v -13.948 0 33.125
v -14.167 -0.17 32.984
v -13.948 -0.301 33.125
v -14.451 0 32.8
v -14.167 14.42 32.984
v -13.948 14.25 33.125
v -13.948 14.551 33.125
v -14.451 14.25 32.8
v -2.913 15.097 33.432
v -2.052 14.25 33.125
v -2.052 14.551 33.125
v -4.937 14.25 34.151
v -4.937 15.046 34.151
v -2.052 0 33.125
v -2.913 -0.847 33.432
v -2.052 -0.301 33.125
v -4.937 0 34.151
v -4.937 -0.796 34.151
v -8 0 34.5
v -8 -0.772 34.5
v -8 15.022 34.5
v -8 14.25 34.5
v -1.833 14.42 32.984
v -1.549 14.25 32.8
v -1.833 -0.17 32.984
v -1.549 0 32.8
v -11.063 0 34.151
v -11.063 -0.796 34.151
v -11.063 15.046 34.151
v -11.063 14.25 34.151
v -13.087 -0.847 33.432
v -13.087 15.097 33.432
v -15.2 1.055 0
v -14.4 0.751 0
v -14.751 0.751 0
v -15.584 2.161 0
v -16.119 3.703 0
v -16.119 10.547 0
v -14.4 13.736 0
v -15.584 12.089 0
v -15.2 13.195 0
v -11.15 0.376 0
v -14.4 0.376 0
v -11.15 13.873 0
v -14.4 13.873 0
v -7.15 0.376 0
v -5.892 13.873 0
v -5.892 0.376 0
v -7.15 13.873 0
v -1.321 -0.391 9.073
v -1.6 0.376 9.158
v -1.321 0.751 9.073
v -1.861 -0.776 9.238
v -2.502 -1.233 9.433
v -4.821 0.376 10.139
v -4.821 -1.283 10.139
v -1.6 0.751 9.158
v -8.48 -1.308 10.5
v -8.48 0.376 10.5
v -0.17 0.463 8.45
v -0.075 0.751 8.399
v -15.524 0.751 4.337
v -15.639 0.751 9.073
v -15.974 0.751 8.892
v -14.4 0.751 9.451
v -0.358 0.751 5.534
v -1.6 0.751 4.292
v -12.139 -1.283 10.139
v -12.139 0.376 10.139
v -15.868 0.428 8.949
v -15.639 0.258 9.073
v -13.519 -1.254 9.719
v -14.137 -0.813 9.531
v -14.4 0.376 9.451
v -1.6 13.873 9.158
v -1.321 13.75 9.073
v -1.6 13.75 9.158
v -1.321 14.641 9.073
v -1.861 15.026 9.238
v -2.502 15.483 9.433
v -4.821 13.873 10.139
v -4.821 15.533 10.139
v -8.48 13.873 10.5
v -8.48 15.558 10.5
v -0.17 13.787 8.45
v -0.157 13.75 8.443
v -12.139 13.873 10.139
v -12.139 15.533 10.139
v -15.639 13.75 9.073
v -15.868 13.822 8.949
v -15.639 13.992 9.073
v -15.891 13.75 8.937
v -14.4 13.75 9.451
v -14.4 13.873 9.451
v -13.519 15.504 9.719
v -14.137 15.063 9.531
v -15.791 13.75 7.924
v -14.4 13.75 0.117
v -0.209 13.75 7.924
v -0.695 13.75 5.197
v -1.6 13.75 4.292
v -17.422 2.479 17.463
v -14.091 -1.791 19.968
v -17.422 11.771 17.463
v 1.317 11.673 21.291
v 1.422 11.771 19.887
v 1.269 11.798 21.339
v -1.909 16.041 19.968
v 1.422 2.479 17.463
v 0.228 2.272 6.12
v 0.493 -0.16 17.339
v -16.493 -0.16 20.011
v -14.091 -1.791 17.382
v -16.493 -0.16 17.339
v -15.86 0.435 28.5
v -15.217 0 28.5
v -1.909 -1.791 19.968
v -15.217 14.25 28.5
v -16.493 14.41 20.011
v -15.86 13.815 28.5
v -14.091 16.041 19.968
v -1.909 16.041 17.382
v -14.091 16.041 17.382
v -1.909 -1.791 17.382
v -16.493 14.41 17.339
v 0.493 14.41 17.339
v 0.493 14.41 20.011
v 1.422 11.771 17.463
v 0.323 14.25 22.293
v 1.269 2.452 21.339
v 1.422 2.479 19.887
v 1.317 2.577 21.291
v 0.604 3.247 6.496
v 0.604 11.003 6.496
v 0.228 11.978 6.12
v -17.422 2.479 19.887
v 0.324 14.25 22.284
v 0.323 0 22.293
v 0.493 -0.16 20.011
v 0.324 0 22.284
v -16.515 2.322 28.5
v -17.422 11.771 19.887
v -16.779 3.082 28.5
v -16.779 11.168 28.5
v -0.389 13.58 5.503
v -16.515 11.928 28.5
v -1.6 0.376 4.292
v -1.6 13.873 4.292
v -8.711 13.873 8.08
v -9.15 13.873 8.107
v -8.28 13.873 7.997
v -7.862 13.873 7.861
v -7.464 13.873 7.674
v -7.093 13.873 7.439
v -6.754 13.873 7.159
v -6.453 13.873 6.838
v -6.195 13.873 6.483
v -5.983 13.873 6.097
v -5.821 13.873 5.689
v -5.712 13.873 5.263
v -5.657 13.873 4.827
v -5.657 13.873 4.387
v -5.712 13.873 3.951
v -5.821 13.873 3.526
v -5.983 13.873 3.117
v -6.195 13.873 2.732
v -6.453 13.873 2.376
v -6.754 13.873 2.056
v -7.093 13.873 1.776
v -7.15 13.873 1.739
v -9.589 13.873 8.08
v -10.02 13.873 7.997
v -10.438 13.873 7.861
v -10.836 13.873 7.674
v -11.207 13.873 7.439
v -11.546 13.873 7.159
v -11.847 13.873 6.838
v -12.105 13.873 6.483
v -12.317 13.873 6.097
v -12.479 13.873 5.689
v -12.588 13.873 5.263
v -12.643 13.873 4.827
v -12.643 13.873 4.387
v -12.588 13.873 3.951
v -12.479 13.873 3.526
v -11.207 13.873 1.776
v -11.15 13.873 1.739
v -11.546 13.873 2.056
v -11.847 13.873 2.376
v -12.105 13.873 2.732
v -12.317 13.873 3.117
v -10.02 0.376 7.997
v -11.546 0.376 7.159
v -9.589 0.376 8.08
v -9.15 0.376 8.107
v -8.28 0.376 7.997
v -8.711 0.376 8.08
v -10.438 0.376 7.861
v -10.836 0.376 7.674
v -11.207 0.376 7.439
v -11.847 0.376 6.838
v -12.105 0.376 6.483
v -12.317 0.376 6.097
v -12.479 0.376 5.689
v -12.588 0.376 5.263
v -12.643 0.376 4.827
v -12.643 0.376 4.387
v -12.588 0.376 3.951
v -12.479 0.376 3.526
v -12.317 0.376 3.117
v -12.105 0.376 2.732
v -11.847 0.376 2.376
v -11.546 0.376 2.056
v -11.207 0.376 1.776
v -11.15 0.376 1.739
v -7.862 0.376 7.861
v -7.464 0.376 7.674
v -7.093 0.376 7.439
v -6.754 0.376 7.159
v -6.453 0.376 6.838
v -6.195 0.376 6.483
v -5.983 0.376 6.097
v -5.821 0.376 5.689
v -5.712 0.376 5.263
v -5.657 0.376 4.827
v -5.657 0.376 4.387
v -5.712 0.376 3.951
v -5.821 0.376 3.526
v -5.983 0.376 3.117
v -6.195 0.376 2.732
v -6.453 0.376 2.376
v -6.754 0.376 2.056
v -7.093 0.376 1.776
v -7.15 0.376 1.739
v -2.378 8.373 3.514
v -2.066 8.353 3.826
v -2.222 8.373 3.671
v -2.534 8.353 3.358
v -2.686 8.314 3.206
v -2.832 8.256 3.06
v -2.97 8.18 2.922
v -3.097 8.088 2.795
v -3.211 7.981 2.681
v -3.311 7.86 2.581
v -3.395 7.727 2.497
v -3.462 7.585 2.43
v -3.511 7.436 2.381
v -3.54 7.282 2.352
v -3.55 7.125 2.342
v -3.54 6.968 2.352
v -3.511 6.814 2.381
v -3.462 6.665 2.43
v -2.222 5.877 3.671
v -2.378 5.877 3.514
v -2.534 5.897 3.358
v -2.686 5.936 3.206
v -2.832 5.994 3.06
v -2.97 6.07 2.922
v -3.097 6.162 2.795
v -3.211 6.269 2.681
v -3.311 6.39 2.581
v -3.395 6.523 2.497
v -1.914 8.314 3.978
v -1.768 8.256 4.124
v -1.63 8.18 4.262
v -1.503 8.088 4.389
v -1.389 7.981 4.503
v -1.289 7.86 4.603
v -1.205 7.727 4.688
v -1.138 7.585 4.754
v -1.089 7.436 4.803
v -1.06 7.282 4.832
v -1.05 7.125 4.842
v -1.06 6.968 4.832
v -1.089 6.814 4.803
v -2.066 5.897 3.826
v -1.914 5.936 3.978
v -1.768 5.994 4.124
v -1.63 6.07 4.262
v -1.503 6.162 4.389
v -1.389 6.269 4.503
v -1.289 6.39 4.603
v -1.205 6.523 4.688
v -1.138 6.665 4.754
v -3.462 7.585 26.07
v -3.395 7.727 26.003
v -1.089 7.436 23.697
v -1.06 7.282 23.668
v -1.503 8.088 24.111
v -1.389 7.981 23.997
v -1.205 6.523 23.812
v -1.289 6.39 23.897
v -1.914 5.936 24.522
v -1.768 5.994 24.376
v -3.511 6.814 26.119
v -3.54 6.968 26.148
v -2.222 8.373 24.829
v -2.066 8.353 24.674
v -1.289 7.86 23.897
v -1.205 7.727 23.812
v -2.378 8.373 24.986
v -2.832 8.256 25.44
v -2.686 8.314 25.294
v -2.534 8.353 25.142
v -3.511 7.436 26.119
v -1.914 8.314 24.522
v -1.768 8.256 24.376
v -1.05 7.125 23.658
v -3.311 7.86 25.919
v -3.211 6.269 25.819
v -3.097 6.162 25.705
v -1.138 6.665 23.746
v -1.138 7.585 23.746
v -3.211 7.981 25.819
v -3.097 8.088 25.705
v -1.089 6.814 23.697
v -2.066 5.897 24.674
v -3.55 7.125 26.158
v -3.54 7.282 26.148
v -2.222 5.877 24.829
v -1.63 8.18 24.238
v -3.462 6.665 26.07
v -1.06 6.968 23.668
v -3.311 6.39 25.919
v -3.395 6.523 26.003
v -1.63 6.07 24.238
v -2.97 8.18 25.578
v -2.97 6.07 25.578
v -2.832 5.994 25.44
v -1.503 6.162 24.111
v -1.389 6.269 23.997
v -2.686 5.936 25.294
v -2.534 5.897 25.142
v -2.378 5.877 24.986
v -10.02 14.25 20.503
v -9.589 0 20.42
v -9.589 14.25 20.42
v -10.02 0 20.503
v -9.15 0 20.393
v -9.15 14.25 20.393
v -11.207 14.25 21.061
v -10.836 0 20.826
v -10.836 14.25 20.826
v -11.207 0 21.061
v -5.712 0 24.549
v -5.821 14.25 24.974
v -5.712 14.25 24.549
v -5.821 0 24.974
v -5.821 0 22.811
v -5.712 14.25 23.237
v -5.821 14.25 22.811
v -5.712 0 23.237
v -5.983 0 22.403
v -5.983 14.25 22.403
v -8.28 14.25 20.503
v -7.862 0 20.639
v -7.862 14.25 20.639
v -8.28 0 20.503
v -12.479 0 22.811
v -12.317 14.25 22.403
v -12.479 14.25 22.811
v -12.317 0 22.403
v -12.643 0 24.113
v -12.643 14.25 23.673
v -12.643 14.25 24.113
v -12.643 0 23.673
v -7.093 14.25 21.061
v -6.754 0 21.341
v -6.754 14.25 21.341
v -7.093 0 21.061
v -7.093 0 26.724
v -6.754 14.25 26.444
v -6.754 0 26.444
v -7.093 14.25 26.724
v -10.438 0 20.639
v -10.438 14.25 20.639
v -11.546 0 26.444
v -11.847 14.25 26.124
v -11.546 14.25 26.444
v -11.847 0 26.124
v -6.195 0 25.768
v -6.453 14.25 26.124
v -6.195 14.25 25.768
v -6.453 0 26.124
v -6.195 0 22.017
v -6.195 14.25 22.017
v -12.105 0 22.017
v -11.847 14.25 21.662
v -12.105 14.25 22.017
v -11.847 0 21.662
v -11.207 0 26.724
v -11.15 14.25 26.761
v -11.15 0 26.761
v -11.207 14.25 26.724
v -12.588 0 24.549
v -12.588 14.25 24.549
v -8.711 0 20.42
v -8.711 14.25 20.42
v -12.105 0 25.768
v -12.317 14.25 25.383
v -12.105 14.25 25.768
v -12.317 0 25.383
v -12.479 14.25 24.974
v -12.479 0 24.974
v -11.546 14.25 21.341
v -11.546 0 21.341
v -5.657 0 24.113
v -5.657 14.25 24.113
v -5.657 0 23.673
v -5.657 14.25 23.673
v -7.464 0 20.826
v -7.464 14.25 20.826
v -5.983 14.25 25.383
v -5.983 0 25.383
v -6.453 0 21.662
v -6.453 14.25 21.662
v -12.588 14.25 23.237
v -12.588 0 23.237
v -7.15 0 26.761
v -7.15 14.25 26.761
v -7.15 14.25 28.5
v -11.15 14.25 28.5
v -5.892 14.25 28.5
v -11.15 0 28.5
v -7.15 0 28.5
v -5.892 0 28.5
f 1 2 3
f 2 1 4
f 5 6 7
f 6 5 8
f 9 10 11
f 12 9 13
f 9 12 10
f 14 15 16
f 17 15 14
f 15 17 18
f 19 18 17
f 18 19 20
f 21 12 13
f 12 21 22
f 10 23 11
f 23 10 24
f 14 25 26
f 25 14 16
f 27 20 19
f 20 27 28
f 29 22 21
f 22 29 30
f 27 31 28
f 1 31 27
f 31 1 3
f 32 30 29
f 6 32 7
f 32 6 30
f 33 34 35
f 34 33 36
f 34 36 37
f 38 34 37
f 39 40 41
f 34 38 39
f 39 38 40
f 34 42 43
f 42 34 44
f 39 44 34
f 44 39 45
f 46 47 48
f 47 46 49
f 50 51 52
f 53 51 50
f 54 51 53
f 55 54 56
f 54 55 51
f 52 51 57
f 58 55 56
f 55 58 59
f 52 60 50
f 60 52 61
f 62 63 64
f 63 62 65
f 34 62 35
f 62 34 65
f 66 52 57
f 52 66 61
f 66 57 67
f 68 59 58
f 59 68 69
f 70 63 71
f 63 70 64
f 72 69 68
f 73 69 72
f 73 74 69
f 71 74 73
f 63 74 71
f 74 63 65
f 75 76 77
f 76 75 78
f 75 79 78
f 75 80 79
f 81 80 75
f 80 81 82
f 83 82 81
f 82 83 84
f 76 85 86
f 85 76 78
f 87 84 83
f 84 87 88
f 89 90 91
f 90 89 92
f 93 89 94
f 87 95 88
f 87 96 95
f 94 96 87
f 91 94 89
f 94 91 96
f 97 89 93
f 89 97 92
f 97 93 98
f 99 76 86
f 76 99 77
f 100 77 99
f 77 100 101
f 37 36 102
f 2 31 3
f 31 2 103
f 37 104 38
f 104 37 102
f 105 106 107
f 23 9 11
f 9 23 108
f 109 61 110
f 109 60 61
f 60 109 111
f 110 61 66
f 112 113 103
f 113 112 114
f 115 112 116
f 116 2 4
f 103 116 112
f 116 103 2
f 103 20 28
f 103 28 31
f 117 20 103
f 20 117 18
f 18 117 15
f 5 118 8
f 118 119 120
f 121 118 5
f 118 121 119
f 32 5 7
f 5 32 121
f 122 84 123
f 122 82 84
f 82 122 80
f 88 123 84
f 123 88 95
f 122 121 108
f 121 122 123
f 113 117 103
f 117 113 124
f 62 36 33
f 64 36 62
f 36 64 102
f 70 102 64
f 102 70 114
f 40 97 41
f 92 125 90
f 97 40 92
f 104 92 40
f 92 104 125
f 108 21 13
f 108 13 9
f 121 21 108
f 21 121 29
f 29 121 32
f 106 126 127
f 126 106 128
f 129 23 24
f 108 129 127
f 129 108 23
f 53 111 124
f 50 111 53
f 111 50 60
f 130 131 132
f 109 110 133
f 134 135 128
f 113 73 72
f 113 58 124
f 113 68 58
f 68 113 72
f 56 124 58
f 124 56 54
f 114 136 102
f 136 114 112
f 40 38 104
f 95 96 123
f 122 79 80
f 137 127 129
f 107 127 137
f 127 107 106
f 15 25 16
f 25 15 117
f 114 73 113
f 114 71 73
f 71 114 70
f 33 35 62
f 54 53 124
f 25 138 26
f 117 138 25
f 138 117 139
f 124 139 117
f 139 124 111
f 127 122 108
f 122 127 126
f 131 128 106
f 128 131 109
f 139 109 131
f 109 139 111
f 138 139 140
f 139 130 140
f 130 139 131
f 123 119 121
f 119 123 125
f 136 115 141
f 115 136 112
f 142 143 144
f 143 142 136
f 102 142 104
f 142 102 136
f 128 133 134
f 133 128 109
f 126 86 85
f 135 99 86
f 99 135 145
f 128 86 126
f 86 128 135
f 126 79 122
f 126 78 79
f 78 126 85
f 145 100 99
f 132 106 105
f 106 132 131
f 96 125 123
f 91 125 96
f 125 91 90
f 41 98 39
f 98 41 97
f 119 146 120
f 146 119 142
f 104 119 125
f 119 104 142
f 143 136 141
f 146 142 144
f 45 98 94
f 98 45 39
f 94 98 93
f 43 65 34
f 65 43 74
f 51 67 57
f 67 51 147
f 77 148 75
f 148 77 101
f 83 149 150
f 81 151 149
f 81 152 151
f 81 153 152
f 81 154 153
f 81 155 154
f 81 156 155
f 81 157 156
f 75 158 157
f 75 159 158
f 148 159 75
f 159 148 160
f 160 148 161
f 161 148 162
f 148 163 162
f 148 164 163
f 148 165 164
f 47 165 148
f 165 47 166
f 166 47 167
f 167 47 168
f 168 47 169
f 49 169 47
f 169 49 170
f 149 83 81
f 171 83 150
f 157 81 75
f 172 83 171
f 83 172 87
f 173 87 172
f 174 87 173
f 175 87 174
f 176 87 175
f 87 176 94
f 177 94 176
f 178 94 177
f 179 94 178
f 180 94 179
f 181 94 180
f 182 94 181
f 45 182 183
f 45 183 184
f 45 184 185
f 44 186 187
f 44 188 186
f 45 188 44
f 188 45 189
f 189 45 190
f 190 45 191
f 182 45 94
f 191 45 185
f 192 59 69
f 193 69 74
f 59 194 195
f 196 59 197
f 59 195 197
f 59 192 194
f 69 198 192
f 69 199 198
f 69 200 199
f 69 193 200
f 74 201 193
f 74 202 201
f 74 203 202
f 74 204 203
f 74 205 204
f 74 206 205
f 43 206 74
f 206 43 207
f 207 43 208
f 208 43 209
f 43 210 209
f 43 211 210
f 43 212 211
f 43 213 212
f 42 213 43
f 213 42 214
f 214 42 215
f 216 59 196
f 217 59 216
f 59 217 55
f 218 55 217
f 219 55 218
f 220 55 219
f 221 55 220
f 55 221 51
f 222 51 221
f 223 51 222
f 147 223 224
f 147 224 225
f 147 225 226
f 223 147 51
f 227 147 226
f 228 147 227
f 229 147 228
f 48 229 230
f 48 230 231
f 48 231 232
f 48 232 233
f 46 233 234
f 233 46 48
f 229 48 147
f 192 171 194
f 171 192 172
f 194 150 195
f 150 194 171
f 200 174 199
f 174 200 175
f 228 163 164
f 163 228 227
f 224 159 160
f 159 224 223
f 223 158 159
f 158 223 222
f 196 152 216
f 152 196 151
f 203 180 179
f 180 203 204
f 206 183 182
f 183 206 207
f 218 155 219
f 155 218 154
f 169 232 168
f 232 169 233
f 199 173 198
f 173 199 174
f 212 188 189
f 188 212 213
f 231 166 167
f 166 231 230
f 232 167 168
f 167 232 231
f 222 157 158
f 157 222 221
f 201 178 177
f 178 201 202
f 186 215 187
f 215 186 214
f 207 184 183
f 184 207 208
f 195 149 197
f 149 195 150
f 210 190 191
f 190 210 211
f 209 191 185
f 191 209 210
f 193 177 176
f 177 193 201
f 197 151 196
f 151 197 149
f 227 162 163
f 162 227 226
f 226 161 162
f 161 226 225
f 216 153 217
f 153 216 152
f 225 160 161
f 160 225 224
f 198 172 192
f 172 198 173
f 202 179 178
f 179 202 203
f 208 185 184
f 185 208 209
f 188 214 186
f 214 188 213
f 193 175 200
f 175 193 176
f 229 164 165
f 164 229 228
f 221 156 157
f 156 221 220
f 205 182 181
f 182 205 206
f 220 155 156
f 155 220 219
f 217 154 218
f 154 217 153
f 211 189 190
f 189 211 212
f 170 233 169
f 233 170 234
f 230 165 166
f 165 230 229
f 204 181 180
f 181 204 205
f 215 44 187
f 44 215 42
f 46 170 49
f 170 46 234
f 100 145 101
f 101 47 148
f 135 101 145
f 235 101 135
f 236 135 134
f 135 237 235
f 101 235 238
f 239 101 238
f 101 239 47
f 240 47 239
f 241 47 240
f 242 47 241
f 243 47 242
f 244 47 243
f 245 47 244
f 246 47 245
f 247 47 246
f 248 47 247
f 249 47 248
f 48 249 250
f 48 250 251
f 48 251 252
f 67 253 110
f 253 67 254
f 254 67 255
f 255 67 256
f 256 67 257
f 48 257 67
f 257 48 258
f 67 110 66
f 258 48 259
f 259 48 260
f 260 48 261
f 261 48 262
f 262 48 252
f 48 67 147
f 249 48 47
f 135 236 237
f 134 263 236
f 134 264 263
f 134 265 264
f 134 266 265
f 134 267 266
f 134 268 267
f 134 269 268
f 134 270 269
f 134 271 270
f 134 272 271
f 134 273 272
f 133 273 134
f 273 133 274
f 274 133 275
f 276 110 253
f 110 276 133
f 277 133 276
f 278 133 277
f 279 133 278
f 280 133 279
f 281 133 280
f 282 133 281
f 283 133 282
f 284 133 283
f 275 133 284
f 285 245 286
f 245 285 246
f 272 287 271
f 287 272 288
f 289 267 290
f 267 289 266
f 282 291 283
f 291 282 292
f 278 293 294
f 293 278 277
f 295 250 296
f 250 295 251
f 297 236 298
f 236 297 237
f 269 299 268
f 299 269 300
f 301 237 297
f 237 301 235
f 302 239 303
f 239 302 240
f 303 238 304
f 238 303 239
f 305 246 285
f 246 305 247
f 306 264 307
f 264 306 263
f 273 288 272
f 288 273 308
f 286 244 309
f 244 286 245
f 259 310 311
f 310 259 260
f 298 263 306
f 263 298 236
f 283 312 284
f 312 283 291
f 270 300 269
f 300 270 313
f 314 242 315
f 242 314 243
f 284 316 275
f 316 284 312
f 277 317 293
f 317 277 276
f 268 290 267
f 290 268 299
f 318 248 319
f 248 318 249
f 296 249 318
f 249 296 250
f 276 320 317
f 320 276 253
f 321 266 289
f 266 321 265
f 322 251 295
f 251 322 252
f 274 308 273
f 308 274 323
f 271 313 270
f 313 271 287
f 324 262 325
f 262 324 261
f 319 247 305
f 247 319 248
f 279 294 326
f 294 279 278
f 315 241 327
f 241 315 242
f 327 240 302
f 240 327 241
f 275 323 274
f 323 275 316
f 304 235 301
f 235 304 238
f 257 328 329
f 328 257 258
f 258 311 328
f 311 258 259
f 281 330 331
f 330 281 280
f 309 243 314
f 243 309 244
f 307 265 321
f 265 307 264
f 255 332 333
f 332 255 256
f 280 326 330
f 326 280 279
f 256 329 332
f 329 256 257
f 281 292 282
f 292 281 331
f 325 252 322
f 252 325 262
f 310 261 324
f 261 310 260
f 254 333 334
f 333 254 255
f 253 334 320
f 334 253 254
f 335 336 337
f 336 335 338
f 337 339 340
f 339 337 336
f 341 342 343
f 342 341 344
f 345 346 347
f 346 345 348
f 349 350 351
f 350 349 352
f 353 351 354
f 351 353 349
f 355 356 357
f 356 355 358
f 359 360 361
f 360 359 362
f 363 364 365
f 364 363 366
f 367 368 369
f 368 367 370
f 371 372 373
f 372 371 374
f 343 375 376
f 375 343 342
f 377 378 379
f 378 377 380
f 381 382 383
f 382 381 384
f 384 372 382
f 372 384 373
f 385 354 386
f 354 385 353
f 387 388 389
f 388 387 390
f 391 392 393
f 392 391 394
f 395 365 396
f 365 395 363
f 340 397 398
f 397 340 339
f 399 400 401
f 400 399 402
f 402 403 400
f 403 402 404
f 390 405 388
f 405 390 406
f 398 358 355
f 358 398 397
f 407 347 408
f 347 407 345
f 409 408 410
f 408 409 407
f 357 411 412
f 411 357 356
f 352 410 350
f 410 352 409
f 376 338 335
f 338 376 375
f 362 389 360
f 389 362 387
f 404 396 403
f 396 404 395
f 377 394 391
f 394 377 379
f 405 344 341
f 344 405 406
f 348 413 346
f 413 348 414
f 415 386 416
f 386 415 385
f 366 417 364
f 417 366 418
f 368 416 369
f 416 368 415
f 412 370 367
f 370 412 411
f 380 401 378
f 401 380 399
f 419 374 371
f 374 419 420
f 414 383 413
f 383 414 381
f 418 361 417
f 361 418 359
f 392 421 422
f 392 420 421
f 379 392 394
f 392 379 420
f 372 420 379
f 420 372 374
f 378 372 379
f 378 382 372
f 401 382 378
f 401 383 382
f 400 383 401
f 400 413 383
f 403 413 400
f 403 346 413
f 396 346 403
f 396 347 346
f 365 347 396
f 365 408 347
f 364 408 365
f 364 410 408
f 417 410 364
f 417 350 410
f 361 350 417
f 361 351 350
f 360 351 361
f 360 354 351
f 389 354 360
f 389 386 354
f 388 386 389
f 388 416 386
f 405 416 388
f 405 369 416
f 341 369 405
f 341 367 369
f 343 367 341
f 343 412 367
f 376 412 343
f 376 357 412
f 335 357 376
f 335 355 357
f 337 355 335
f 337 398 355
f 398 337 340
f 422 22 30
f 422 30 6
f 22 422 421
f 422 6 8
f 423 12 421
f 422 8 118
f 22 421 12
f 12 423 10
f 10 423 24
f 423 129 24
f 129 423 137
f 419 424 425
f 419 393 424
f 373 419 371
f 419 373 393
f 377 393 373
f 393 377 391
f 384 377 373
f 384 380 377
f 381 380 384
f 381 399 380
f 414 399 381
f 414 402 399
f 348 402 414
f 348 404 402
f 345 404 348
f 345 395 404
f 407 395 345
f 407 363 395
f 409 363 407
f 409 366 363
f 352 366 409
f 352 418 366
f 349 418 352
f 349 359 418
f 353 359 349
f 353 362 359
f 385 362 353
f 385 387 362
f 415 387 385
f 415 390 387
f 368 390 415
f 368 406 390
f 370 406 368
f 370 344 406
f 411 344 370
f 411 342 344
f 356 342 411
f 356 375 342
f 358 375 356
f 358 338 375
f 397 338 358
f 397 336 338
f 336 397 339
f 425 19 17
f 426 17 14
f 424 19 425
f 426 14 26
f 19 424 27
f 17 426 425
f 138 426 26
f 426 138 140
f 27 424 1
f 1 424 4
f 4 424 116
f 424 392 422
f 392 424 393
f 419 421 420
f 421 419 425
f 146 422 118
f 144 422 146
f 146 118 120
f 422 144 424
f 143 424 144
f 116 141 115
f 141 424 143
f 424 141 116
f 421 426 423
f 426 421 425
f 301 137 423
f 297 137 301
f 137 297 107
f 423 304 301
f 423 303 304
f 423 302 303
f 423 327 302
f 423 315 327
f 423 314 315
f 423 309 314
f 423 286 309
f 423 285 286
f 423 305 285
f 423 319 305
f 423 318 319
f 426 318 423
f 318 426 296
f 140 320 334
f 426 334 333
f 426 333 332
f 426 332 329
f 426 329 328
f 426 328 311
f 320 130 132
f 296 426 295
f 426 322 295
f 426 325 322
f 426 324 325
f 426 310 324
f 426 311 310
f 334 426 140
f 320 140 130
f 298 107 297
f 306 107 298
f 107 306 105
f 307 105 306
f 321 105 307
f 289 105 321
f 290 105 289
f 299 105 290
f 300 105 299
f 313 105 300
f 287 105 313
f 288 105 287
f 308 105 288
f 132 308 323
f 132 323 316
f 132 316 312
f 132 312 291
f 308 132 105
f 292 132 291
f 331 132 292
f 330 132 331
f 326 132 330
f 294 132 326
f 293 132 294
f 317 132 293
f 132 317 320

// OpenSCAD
// file: finger_mid.scad
include <../config.scad>
use <finger_base.scad>

rotate([0,-90,0]) fingermid();

//	Middle segment of finger, can be lengthened
module fingermid(length=19, proximalHole=true, distalHole=true)
{
	difference() {
		scale([yScaleFactor,xScaleFactor,zScaleFactor]) {
			fingerbasesolid(length);
		}
		if(proximalHole) {
			translate([0,knucklePadding/2 * xScaleFactor,0]) fingerhardwarecutouts(jointDia, jointThick, knuckleW=knuckleW-knucklePadding, fingerLen=length);
		}
		if(distalHole) {
			translate([length * yScaleFactor,0,0]) mirror([1,0,0]) fingerhardwarecutouts(jointDia, jointThick, knuckleW=knuckleW, fingerLen=length);
		}
	}
}
// file: finger_base.scad
include <../config.scad>

//rotate([0,-90,0]) fingerbase();

//	Base segment of finger, can be lengthened
module fingerbase(length=23, proximalHole=true, distalHole=true)
{
	difference() {
		scale([yScaleFactor,xScaleFactor,zScaleFactor]) {
			fingerbasesolid(length);
		}
		if(proximalHole) {
			translate([0,knucklePadding/2 * xScaleFactor,0]) fingerhardwarecutouts(jointDia, jointThick, knuckleW=knuckleW-knucklePadding, fingerLen=length);
		}
		if (distalHole) {
			translate([length * yScaleFactor,0,0]) mirror([1,0,0]) fingerhardwarecutouts(jointDia, jointThick, knuckleW=knuckleW, fingerLen=length);
		}
	}


	
}

module fingerhardwarecutouts(jointDia,jointThick,knuckleW,fingerLen,holeCutoff=100) {
	//slot for flex joint
	translate([7 - (15/jointDia),0,6*zScaleFactor - (1.8/jointThick)]) {
		rotate([90,0,0]) translate([-0.25,0,-knuckleW*xScaleFactor]) cylinder(d=jointDia, h=knuckleW*xScaleFactor, $fn=50);
		translate([-25,(knuckleW*xScaleFactor) / 2,0]) cube([50,knuckleW*xScaleFactor,jointThick], center=true);
	}
	//cubic parts
	translate([-100,0,0]) cube([100,knuckleW*xScaleFactor,100]);
	translate([-5.5*yScaleFactor,0,0]) rotate([0,45,0]) translate([-50,0,0]) cube([100,knuckleW * xScaleFactor, 10]);

	//channel for string/tendon
	translate([-fingerLen/2 * yScaleFactor, knuckleW/2 * xScaleFactor, 2.3]) rotate([0,90,0]) cylinder(d=2.5, h=holeCutoff, $fn=50);
}

//	base segment of finger, solid
module fingerbasesolid(length=50, cutout=true) {
	difference() {
		//cubic part
		translate([0,0.001 + knucklePadding/2,1]) cube([length, knuckleW - knucklePadding - 0.002, 8]);
	}
	
	//cylindrical-ish part around finger
	intersection() {
		//overly large shape to get the cross section in the XZ plane from
		difference() {
			union() {
				translate([length-4,-5,5]) rotate([-90,0,0]) cylinder(r=8,h=knuckleW + 10);
				translate([0,-5,-5]) cube([length,knuckleW + 10,20]);
			}
			//cutout for the side "guards" of the previous knuckle
			if(cutout) {
				translate([-4,-knuckleW+0.001,5.3]) rotate([-90,0,0]) cylinder(r=11,h=10);
				translate([-4,knuckleW - knucklePadding*(1/xScaleFactor),5.3]) rotate([-90,0,0]) cylinder(r=11,h=10);
			}
		}

		hull() {
			for(i=[-1,1], j=[-1,1]) {
				//angled cylinders to provide the outer shape of the finger
				translate([length/10,i*2.4 + knuckleW/2,j*2.2 + 5]) rotate([i*j*-4,j*86,0]) cylinder(d=6,h=20,center=true);
				translate([length+4, i*2.4 + knuckleW/2, j*2.2 + 5]) rotate([i*j*-4,j*-86,0]) cylinder(d=6,h=20,center=true);
			}
		}
	}
}
// file: finger_tip.scad
include <../config.scad>
include <finger_base.scad>
include <finger_mid.scad>

//rotate([0,-90,0]) fingertip_curved_solid(pad=fingerPads);

/**
 * @id finger_tip
 * @name Finger Tip
 * @category Printed
 */

module fingertip_curved_solid(length=17, pad=true, hole=true) {
//	if (!pad)
//		fingertip(length=length);
//	else {
		render() difference() {
			union() {
				fingermid(length=length+3, proximalHole=true, distalHole=false);
				translate([length*yScaleFactor,0,1.5*zScaleFactor]) rotate([0,30,0]) fingertip(length=length, proximalHole=false, cutout=false);
			}
			//hole for string
			if(hole) translate([0,xScaleFactor * knuckleW/2,2]) rotate([0,90,0]) cylinder(d=2.5,h=100, $fn=50);
			//hollow for soft pad
			if(pad) translate([length*yScaleFactor,0,1.5*zScaleFactor]) rotate([0,30,0]) fingertip_pad(length);
		}
//	}
}

module fingertip_solid(length=15, pad=true) {
	if (!pad)
		fingertip(length=length);
	else {
		render() difference() {
			fingertip(length=length);
			if(pad) fingertip_pad(length);
		}
	}
}

module fingertip_pad(length) {
	difference() {
		fingertip(length,pad=false, proximalHole=false, cutout=false);
		translate([0,-10,-10]) cube([length-7,50,50]);
		translate([0,0.2*xScaleFactor,4.5]) cube([length+5,xScaleFactor * (knuckleW - knucklePadding),8]);
		translate([0,xScaleFactor * knuckleW/2,0]) {
			rotate([0,60,0]) cylinder(d=8, h=100);
		}
	}
}

//	tip segment of finger, can be lengthened
module fingertip(length=15, proximalHole=true, cutout=true)
{
	intersection() {
		difference() {
			scale([yScaleFactor,xScaleFactor,zScaleFactor]) {
				fingerbasesolid(length,cutout);
			}
			if(proximalHole) {
				translate([0,knucklePadding/2 * xScaleFactor,0]) fingerhardwarecutouts(jointDia, jointThick, knuckleW=knuckleW-knucklePadding, fingerLen=length, holeCutoff=(length-0.5)*2);
				translate([(length - 5) * yScaleFactor,(knuckleW/2) * xScaleFactor,0])
					rotate([0,30,0]) translate([0,0,2]) cylinder(d=2.5, h=100, $fn=50);
			}
		}
		translate([(length-10)*xScaleFactor,0,21*zScaleFactor]) rotate([-90,0,0]) cylinder(d=70, h=100, center=true);
	}
}
// file: ../config.scad
/**
 * Configuration settings for Flexy Beast, required to generate correctly sized STLs of the printed parts. See the Configuration File Assembly instructions to set this up.
 * @id config_file
 * @name Configuration File
 * @category Prerequisites!
 * @step Open config.scad in your favorite text editor.
 * @step As per the normal Cyborg Beast instructions, measure the width of the knuckles in the non-affected hand and convert to millimeters.
 * @step Add 5 to that result and then divide by 55.
 * @step Replace the x-, y-, and zScaleFactor variables in config.scad with that number.
 * @step If desired, adjust the proportions of the hand by changing those variables individually. xScaleFactor controls the width of the hand, yScaleFactor controls the length, and zScaleFactor controls the height.
 * @step Open assembly.scad in OpenSCAD to check that the flexy joint holes are not too large for the hand (should only be necessary for small children). If necessary, reduce the jointDia and jointThick variables. jointDia=5 and jointThick=2 is a good amount for smaller hands.
 * @step Set the fingerPads variable to true or false depending on whether you want to cast silicone finger pads for improved grip.
 * @step In palm.scad, finger_base.scad, finger_tip.scad, and thumb_tip.scad, uncomment the first line that renders the part.
 * @step Render each part (F6) and export as STL, then print.
 */

knuckleR = 4.85;
knucklePadding = 0.5;
knuckleW = 9.5;
wristH = 10;
palmH = 20;
palmW = 64;
th = 3;
fn = 32;

//flexy joint parameters
jointDia = 7;
jointThick = 4;

//finger pad settings
fingerPads = true; //whether or not to hollow the finger tips slightly for molding pads

//desired scale factor for hand based on the standard Cyborg Beast/Robohand sizing guide
xScaleFactor = 1.5; // [1.05:1.60]
yScaleFactor = 1.5; // [1.05:1.60]
zScaleFactor = 1.6; // [1.05:1.60]
// main file
include <../config.scad>
include <finger_tip.scad>

//rotate([0,-90,0]) thumbtip();

/**
 * @id thumb_tip
 * @name Thumb Tip
 * @category Printed
 */

module thumbtip()
	{
	//	difference() {
	fingertip_solid(length=20, pad=fingerPads);
	//	translate([20/2,0,0]) cube([20,70,50], center=true); }
	}
